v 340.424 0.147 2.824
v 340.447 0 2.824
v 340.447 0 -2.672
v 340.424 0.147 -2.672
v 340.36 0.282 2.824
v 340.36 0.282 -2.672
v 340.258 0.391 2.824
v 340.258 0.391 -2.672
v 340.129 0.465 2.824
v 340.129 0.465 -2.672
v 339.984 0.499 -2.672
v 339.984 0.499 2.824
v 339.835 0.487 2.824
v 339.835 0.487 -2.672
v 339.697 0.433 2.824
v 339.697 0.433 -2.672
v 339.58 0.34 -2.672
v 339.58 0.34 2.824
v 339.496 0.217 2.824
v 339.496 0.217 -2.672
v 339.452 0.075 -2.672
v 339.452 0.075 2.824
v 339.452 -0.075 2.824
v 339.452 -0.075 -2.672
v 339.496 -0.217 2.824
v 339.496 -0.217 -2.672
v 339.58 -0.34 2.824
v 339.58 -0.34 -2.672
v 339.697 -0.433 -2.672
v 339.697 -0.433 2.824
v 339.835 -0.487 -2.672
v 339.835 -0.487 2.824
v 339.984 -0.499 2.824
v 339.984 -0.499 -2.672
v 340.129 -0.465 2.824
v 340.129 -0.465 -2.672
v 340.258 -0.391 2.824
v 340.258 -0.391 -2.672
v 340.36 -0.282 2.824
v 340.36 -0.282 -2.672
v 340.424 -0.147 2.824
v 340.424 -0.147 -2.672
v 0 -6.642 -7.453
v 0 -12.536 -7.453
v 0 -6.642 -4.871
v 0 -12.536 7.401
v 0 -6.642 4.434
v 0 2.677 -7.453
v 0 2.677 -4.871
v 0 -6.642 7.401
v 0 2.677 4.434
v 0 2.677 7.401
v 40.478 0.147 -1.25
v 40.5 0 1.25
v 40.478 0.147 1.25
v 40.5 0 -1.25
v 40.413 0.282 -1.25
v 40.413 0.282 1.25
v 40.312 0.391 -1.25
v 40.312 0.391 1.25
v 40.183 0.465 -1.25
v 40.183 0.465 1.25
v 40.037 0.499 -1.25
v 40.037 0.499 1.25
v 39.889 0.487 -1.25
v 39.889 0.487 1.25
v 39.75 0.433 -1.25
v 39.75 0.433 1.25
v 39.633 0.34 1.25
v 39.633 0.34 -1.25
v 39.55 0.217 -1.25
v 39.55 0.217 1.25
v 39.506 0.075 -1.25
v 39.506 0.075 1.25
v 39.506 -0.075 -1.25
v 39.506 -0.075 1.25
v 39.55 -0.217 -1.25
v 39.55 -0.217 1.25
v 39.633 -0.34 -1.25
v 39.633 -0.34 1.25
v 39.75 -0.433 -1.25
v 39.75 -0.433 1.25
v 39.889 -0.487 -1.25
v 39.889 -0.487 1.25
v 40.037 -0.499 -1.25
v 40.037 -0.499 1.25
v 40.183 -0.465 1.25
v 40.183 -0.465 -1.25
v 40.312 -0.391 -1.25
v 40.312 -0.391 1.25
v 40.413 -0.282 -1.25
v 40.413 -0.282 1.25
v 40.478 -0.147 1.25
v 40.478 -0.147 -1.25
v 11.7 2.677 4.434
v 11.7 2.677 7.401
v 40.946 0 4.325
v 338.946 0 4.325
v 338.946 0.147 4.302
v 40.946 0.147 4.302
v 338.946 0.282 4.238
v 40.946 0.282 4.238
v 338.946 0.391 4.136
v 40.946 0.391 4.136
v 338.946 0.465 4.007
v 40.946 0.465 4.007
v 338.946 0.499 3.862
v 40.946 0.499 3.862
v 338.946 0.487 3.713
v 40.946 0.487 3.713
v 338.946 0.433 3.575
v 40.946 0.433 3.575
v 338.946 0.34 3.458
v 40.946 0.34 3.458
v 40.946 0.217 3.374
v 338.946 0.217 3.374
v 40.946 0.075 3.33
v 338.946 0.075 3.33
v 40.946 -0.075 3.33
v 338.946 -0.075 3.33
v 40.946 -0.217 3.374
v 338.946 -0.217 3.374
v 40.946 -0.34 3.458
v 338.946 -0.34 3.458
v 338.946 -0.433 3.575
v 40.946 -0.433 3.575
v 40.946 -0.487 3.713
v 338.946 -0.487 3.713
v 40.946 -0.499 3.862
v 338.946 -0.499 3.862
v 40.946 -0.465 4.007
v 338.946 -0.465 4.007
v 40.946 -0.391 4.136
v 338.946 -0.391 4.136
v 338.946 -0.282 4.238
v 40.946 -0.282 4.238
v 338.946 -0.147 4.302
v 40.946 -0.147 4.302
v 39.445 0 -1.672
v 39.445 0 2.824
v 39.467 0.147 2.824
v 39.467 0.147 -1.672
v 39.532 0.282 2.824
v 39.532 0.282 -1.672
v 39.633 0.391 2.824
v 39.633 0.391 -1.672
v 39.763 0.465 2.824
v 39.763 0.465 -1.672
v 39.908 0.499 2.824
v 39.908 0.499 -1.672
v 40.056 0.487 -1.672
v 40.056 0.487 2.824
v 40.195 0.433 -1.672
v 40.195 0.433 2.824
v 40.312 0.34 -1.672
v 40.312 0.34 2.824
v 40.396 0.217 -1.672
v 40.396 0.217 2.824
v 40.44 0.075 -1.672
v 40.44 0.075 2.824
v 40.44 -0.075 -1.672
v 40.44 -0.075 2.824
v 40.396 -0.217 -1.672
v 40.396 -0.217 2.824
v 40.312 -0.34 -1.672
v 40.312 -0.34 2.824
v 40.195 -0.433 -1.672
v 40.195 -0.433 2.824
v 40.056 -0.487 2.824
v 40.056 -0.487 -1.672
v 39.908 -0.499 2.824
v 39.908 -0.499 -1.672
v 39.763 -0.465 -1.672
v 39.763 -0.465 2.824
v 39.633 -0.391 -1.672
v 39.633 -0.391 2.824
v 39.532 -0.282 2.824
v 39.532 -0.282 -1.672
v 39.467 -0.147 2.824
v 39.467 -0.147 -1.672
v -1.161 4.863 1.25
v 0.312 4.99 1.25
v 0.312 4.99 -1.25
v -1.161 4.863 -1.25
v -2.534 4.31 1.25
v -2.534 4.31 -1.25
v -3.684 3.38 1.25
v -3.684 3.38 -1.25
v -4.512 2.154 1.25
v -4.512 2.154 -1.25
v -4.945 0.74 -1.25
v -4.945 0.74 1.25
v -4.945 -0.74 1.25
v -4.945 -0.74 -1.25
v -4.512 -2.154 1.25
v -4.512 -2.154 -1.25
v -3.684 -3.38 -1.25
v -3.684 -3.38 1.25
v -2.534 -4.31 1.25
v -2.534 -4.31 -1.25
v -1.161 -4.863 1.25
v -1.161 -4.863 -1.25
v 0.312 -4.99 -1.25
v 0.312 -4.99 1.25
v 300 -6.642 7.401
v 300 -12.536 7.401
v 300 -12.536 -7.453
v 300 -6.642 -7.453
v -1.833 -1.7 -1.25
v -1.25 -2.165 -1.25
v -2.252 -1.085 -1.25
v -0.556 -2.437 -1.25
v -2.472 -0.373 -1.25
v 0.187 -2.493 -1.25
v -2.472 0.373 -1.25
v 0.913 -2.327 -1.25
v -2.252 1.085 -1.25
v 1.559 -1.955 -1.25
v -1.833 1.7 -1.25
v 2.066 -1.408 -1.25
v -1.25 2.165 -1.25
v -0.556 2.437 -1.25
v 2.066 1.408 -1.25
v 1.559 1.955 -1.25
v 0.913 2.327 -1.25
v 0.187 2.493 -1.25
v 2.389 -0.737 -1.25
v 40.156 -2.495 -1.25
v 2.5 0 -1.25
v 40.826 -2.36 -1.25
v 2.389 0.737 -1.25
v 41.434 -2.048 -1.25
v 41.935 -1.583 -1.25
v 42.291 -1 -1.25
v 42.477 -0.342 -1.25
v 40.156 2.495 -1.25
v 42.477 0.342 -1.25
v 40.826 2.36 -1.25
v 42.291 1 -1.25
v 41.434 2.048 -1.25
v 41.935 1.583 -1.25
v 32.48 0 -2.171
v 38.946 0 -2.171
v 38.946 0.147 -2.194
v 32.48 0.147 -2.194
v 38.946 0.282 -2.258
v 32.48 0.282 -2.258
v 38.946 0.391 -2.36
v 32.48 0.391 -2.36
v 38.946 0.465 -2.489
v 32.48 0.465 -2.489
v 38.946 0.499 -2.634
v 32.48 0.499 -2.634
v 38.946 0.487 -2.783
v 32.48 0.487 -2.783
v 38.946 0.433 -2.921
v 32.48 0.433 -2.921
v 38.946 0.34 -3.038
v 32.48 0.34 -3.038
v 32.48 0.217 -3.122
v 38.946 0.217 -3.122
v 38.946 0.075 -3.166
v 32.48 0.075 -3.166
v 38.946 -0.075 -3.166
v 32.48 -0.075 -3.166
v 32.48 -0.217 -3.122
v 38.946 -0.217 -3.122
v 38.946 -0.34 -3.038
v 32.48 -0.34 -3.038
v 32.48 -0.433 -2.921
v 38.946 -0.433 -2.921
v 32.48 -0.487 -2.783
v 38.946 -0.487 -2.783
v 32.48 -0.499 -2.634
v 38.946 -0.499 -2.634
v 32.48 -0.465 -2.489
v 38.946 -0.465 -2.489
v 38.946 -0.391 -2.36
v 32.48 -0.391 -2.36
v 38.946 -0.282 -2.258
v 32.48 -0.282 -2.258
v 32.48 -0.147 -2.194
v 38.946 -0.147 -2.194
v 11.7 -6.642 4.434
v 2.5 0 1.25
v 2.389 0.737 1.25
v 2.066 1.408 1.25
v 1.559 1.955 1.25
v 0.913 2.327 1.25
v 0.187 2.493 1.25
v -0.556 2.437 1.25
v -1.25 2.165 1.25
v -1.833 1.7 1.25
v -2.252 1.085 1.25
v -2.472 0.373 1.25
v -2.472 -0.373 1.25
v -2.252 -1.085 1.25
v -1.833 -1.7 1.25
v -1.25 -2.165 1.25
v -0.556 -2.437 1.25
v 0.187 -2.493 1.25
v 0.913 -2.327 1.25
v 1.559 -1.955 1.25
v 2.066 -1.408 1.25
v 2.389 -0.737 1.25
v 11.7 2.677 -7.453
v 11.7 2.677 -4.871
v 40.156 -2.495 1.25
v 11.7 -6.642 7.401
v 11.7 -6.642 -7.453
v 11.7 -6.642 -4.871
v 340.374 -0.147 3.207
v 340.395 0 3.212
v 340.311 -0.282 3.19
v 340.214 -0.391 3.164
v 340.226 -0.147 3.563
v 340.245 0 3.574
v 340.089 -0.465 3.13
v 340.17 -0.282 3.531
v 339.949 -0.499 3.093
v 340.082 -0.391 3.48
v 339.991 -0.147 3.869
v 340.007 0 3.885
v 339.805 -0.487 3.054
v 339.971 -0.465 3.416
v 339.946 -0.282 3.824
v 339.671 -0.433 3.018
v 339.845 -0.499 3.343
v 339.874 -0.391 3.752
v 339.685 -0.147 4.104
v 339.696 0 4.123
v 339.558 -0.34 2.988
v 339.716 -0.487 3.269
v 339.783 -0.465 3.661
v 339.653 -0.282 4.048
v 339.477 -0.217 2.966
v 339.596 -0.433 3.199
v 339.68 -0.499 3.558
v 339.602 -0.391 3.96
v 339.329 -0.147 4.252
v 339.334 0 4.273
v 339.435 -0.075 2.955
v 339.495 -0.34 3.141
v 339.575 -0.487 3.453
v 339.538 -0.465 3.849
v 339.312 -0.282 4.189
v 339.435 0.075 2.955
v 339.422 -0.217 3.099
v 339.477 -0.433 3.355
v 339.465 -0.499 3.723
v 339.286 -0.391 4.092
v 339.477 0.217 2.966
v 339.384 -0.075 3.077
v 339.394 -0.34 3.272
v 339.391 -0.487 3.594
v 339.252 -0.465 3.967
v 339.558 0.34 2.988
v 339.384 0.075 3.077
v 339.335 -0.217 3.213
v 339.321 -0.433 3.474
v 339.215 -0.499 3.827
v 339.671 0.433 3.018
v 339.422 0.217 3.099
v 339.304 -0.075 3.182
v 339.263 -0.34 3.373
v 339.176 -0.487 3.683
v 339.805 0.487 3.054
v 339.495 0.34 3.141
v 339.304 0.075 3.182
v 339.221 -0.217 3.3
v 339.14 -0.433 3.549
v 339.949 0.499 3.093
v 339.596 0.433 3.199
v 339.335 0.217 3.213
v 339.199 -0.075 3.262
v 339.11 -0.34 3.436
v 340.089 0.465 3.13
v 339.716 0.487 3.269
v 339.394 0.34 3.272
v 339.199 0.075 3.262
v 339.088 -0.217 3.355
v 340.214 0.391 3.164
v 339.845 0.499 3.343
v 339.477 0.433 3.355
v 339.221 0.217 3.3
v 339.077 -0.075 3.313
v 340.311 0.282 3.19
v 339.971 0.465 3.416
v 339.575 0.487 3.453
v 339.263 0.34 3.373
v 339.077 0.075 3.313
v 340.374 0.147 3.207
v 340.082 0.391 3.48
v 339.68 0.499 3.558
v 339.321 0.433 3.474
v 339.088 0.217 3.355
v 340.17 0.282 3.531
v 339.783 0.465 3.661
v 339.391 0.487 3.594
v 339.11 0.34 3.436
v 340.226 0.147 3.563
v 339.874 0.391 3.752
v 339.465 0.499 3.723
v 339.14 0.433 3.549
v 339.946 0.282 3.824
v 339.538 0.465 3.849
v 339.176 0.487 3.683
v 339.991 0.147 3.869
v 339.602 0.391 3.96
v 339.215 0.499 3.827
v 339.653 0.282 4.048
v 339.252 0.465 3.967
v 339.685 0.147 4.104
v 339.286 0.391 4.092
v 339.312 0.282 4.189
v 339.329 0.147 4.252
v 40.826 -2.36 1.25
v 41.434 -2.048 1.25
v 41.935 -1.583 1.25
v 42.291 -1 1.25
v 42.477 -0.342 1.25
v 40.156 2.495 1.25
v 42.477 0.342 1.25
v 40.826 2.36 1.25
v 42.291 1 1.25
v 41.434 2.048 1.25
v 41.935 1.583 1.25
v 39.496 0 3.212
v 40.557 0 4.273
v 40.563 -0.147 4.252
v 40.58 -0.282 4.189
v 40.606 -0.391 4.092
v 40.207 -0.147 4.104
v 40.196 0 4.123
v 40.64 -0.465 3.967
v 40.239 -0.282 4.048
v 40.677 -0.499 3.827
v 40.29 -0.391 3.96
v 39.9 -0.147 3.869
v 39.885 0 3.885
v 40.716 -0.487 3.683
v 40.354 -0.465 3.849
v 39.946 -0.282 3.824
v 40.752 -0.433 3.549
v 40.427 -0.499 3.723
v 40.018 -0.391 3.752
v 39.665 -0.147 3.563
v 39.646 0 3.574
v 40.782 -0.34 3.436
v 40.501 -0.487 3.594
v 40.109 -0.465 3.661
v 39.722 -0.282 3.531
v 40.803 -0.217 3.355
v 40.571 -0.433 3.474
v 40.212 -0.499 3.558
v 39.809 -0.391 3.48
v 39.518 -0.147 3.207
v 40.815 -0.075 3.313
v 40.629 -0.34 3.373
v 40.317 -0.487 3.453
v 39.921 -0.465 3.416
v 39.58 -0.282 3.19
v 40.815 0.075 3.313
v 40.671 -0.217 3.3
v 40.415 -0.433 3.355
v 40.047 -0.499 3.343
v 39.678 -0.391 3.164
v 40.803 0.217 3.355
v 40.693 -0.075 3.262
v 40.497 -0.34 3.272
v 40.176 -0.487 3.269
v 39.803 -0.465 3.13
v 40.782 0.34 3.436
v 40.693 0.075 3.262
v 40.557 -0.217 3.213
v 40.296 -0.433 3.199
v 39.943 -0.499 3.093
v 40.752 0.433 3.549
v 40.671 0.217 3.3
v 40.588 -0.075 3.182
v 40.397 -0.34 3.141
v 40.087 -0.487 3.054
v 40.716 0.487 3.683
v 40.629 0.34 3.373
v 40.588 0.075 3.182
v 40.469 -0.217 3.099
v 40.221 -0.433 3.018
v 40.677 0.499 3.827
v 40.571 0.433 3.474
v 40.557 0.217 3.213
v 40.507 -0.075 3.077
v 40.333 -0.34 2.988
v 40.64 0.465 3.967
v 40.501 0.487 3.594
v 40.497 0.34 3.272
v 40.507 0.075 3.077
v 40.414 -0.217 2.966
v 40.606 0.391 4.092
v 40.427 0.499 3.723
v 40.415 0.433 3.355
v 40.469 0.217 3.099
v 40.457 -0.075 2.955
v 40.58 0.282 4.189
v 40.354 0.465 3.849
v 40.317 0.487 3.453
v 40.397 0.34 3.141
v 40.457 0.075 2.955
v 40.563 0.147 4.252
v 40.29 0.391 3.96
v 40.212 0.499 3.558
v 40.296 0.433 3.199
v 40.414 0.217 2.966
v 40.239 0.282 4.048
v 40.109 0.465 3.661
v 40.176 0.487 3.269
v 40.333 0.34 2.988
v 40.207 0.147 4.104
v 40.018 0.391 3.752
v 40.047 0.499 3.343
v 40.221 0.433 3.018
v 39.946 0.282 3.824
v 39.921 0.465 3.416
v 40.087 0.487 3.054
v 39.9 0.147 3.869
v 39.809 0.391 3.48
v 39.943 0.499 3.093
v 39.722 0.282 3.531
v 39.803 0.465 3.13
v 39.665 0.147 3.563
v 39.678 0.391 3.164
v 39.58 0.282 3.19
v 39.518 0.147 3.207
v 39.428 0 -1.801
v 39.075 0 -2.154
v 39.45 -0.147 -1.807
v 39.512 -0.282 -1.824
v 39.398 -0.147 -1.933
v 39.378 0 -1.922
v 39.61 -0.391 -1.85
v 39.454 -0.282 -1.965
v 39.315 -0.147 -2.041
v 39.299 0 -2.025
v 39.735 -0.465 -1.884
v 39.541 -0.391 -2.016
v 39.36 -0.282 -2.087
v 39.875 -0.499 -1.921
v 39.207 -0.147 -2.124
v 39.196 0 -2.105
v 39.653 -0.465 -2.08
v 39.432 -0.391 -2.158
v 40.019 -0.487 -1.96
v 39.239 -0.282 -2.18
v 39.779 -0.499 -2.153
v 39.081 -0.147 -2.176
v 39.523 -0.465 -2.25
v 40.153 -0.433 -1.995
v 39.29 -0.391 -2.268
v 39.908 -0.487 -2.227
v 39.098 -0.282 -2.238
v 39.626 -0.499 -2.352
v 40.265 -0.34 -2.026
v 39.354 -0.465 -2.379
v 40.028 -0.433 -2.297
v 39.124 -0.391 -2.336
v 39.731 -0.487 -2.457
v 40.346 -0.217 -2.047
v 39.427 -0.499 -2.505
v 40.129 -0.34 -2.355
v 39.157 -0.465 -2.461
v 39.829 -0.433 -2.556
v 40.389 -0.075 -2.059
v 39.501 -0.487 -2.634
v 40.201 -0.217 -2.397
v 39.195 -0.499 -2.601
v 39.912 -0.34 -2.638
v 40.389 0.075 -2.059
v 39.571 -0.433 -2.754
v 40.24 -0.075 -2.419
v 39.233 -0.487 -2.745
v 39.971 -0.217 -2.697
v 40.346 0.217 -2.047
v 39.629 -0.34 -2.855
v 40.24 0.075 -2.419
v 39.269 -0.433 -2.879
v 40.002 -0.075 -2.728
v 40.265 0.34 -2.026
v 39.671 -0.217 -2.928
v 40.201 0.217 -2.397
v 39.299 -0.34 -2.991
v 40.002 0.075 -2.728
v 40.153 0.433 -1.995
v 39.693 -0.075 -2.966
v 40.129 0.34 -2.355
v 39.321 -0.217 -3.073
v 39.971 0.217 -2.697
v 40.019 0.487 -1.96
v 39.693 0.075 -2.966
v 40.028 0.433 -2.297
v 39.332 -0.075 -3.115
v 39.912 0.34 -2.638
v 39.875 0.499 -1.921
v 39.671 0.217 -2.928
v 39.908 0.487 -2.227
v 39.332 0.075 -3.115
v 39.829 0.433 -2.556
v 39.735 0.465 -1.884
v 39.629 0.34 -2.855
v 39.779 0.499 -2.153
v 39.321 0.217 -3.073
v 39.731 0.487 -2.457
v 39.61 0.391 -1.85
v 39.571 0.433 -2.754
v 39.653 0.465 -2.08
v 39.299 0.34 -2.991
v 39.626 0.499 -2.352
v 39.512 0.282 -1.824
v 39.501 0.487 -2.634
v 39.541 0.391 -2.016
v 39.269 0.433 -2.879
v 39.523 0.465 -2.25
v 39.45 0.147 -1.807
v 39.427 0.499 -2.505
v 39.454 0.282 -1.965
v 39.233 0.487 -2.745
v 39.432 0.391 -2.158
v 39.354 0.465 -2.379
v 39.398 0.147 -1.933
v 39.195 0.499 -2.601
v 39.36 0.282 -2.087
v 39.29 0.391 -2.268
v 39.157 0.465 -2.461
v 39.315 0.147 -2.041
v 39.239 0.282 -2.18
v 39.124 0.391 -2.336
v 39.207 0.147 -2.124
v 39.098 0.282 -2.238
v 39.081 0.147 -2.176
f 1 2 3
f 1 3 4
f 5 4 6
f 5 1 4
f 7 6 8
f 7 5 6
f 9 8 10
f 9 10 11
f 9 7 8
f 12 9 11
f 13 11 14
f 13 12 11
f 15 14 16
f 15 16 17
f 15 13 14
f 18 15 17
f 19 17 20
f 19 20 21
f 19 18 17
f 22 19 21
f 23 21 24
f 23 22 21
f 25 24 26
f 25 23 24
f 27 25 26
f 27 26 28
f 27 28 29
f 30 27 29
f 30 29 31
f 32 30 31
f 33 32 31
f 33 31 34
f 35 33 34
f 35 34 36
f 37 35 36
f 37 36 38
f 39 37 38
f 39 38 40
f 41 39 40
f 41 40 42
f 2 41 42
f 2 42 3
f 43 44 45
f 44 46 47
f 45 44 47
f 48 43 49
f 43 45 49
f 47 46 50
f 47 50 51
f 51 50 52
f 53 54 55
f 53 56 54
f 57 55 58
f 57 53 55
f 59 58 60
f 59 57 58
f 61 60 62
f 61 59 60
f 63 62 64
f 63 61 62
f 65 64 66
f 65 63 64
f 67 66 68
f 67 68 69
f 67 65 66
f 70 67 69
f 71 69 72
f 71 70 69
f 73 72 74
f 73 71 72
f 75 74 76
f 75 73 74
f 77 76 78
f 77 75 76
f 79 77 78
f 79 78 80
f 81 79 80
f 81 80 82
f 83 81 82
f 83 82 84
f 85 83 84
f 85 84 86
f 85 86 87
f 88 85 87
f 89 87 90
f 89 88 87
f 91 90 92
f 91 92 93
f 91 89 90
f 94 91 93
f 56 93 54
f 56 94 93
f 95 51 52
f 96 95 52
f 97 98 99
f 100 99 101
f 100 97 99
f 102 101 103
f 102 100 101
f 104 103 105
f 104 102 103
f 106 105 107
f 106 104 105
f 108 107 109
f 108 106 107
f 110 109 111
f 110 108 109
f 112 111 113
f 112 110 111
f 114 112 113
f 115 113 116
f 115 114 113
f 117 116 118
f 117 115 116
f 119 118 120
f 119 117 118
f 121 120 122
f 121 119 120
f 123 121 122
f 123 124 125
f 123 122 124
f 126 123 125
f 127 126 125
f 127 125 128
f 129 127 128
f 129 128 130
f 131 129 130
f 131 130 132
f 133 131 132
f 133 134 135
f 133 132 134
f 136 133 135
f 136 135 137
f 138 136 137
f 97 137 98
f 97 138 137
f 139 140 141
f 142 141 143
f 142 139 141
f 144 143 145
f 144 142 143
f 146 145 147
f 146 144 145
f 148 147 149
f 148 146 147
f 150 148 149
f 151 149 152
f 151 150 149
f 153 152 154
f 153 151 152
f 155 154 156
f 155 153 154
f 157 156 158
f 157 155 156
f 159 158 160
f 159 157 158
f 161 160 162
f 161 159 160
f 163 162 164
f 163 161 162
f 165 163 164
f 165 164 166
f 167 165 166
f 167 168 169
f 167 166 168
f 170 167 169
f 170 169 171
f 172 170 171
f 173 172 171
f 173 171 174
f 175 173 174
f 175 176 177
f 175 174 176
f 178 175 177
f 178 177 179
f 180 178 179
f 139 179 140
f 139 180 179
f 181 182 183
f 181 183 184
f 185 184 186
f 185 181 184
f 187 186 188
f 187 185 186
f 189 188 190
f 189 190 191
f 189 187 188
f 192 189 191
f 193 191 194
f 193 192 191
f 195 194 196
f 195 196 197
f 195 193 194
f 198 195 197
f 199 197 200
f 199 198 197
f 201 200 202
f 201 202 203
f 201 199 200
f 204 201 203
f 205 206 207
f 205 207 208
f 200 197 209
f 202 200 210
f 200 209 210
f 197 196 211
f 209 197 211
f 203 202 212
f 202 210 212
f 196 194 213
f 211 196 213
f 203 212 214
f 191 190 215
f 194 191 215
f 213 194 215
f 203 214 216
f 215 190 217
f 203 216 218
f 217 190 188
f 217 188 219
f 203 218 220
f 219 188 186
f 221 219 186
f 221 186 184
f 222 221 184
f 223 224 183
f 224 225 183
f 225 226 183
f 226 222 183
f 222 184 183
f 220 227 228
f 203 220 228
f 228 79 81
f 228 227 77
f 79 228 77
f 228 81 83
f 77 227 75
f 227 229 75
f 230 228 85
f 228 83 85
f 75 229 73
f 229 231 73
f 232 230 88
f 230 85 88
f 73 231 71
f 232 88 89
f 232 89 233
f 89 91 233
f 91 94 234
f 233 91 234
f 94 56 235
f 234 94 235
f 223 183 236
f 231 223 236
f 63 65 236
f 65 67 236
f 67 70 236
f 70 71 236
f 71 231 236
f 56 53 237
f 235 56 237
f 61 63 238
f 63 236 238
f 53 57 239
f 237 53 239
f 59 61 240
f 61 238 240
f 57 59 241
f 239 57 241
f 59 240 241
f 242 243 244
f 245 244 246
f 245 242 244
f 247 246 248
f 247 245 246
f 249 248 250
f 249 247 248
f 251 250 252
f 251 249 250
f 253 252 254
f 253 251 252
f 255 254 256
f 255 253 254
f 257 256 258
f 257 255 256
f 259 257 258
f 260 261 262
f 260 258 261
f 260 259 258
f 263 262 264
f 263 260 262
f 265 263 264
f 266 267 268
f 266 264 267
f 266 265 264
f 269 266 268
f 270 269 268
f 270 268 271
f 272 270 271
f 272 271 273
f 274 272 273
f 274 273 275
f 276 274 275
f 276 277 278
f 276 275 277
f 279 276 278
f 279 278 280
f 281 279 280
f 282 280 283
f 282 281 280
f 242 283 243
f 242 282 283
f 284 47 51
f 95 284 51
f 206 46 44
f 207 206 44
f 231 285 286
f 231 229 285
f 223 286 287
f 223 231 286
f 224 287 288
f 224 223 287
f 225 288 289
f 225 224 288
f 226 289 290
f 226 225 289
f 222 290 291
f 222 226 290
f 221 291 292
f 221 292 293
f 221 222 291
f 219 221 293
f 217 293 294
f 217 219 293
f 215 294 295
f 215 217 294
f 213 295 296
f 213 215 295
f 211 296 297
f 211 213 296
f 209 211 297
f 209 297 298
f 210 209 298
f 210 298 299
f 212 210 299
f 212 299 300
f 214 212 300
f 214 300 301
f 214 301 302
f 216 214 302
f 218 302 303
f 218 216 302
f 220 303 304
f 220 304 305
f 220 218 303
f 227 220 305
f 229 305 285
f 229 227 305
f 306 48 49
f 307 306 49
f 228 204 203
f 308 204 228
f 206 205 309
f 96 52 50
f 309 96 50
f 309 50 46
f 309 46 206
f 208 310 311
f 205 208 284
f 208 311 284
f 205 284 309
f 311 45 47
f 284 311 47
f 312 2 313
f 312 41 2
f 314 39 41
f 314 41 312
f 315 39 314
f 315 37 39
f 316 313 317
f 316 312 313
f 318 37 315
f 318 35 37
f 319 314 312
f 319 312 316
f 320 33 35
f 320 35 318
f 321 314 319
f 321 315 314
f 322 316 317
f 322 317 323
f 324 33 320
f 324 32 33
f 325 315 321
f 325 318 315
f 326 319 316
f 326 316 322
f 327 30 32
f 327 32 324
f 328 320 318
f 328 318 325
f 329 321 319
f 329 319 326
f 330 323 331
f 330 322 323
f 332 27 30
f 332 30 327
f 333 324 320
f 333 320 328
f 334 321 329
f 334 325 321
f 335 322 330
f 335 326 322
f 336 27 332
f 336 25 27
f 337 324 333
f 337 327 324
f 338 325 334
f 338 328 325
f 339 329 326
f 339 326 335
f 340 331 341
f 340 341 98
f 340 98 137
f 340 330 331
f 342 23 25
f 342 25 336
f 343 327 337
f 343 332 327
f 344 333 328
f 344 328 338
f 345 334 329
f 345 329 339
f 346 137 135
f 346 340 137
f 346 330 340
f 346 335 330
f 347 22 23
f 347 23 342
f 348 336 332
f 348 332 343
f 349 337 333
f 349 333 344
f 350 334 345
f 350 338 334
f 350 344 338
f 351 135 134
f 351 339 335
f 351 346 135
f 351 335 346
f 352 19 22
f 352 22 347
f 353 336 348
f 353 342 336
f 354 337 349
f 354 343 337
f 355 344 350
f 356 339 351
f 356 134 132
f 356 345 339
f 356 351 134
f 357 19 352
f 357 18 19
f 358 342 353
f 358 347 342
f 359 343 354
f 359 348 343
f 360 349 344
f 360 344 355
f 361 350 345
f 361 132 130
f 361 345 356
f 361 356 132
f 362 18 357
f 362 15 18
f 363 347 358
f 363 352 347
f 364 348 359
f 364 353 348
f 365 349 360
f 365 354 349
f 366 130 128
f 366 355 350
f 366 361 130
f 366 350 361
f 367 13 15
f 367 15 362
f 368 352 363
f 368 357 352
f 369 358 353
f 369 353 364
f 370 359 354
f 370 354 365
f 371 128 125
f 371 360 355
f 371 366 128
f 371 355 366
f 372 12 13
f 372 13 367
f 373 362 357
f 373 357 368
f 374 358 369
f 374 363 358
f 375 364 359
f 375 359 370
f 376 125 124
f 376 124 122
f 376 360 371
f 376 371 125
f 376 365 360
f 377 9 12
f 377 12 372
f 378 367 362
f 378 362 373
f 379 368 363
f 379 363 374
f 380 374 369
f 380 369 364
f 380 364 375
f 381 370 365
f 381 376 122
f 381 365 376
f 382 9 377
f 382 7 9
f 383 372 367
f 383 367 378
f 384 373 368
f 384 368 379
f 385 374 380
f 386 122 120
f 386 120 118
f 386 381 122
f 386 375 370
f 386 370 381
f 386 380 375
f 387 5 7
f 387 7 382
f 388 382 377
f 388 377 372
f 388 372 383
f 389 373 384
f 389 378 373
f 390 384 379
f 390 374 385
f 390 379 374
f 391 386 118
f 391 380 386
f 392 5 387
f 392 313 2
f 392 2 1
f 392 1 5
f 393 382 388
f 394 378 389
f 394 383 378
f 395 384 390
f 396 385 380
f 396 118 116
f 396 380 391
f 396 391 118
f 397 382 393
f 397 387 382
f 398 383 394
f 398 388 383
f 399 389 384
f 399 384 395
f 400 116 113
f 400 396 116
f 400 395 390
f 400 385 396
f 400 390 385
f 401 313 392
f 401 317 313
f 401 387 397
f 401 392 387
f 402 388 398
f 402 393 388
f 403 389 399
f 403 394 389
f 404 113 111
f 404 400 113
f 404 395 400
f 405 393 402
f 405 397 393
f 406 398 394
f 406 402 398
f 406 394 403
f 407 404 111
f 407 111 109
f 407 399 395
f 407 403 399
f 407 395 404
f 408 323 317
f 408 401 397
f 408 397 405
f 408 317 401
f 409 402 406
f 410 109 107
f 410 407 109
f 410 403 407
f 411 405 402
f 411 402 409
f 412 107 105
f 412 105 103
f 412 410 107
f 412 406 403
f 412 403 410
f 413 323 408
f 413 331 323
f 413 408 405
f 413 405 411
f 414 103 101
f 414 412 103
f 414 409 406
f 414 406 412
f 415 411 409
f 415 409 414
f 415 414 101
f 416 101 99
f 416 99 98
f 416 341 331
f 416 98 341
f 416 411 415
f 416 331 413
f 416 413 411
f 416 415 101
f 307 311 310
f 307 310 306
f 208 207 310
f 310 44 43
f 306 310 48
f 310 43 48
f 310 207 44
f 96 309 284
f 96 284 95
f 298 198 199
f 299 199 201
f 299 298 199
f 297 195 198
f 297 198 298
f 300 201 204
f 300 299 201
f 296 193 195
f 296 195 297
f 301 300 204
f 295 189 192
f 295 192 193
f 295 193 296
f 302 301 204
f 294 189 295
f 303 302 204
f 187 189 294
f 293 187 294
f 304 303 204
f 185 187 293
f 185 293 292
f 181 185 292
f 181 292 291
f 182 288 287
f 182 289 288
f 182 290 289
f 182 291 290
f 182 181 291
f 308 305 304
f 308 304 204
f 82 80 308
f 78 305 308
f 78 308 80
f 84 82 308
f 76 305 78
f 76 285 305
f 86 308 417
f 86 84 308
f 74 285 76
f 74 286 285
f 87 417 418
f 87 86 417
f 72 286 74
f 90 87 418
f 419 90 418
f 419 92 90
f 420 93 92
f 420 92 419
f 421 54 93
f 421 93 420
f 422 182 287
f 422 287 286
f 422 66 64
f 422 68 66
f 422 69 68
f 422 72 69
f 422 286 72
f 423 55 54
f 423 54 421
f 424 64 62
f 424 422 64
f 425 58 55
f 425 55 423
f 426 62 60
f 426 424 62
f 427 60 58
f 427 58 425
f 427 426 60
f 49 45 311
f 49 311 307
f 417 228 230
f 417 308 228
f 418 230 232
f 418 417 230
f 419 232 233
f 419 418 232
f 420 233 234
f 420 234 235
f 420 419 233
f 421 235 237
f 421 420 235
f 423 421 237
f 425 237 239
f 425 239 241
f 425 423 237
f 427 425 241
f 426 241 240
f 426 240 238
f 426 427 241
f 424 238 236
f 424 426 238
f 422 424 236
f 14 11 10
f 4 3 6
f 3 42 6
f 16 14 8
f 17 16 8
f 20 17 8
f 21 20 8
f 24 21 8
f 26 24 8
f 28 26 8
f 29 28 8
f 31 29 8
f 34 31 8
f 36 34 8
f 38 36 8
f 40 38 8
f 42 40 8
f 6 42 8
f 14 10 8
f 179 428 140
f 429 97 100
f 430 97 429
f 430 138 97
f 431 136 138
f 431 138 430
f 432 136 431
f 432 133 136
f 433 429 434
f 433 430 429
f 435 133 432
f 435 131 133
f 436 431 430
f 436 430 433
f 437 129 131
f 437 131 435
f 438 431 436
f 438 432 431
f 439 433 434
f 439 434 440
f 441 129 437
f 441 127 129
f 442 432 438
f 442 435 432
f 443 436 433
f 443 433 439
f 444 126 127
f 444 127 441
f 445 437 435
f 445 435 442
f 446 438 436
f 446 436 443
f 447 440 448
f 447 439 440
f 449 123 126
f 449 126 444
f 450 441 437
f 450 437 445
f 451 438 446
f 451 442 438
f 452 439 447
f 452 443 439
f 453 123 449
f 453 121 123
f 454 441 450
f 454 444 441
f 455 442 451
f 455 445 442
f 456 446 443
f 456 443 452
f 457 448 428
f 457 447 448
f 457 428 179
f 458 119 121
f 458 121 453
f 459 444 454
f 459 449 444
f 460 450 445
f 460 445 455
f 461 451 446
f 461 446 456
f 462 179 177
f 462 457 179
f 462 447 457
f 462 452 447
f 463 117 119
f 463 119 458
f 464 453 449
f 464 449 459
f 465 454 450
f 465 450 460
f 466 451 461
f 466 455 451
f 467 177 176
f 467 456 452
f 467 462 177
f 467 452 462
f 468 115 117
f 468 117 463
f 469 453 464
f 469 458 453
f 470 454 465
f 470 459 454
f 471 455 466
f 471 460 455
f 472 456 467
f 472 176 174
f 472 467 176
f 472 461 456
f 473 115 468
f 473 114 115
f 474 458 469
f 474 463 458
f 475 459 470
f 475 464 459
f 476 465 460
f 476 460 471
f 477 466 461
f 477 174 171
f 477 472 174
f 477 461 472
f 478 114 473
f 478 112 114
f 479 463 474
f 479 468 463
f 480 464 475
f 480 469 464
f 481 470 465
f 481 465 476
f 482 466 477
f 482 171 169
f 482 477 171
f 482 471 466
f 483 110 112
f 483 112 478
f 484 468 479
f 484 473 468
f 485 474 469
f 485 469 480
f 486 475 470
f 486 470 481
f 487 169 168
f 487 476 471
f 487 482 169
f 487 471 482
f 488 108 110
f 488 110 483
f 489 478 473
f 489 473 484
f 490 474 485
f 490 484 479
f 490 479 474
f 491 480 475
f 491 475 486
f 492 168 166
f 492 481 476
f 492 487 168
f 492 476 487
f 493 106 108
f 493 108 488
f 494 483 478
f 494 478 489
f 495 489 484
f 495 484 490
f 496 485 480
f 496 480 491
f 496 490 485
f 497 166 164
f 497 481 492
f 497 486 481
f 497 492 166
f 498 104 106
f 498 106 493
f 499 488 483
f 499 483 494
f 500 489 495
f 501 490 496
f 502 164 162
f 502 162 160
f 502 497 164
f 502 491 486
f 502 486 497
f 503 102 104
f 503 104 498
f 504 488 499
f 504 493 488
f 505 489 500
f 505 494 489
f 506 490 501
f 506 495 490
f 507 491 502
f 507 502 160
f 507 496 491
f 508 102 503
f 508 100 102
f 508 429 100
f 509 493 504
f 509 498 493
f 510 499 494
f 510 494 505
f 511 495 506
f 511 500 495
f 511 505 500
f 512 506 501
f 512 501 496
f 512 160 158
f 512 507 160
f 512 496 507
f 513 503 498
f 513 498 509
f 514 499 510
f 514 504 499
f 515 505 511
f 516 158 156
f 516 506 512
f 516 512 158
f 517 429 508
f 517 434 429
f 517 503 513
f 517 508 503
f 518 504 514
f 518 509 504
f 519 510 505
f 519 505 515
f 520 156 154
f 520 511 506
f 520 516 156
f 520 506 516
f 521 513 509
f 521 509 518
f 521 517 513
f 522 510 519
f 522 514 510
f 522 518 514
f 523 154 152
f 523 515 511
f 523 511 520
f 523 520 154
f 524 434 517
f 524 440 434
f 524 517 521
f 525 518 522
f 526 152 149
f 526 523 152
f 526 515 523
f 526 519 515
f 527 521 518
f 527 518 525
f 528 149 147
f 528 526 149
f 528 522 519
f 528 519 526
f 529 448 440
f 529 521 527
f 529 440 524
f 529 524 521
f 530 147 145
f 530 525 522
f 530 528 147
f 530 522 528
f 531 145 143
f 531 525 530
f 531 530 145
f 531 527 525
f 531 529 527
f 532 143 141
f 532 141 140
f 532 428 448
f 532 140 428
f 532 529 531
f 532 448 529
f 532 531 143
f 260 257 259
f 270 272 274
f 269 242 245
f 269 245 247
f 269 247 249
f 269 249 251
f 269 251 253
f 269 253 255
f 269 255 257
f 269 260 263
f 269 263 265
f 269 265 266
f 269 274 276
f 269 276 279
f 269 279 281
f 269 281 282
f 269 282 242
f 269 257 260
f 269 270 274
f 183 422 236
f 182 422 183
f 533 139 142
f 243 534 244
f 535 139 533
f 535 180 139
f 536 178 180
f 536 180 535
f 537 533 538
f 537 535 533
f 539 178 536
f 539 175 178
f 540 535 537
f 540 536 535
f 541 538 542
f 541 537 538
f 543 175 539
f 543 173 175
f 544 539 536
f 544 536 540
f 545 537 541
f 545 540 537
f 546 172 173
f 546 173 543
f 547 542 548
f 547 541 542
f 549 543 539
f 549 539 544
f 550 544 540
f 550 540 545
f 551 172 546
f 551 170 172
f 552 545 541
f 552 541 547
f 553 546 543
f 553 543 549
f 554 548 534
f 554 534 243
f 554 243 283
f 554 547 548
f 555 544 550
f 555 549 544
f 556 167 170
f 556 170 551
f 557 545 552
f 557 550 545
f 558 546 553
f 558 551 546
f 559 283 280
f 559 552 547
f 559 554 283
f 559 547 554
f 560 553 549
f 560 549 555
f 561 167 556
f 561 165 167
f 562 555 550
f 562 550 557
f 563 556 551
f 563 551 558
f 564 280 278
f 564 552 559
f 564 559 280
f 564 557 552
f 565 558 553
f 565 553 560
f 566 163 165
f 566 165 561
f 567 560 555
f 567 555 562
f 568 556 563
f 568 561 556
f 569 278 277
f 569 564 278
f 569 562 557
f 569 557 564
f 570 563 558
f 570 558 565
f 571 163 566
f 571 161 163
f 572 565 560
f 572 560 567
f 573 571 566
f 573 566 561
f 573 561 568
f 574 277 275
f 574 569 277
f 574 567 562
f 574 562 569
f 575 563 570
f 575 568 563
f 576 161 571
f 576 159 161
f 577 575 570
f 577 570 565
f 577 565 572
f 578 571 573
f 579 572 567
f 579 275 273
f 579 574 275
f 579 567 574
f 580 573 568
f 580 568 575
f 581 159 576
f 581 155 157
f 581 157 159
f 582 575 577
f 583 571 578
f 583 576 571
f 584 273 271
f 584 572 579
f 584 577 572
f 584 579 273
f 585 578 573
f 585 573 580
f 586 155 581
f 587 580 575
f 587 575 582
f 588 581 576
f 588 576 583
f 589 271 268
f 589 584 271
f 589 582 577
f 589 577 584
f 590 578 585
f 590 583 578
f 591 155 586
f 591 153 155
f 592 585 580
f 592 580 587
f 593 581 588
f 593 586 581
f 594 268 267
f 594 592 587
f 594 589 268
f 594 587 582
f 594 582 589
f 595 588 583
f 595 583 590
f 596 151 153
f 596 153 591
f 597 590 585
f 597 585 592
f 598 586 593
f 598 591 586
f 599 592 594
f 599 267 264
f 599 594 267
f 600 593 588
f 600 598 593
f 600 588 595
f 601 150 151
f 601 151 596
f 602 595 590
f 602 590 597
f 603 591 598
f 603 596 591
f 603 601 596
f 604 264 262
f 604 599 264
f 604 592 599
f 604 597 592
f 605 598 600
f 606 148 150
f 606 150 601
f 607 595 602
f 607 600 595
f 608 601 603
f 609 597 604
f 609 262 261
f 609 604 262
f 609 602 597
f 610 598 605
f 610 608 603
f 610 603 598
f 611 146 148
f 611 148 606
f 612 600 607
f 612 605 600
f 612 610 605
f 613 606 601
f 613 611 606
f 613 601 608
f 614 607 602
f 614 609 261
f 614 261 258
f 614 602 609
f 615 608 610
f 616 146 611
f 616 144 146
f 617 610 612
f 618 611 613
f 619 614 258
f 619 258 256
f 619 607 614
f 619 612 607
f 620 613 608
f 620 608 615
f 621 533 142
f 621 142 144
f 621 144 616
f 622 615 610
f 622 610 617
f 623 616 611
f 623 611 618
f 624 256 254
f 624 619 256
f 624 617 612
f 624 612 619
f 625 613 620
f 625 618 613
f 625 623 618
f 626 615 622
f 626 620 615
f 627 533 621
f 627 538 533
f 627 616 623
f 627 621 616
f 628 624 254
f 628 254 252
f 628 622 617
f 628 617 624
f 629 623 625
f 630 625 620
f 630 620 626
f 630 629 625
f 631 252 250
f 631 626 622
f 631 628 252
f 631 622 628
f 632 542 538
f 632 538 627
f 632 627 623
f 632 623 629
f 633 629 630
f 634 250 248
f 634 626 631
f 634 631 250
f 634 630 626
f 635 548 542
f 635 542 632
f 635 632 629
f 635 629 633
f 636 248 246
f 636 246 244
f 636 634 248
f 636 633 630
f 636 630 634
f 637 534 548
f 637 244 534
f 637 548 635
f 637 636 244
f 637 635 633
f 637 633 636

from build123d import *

# Parameters (mm, degrees)
F1_R     = 2.5
F1_R_2   = 0.5
F2_DEPTH = 1.25
F5_R     = 0.5
F8_DEPTH = 300
F7_W     = 9.3189708423
F7_H     = 2.9665171169
F7_H_2   = 2.5825281627
F9_DEPTH = 11.7


with BuildPart() as f2:
    # F1 (on face) → F2 (new body, symmetric)
    with BuildSketch(Plane.XY):
        with BuildLine():
            ThreePointArc((40.15625, -2.4951124098), (42.5, 0), (40.15625, 2.4951124098))
            Line((40.15625, 2.4951124098), (0.3125, 4.9902248196))
            ThreePointArc((0.3125, 4.9902248196), (-5, 0), (0.3125, -4.9902248196))
            Line((0.3125, -4.9902248196), (40.15625, -2.4951124098))
        make_face()
        Circle(F1_R, mode=Mode.SUBTRACT)
        with Locations((40, 0)):
            Circle(F1_R_2, mode=Mode.SUBTRACT)
    extrude(amount=F2_DEPTH, both=True)


with BuildPart() as f6:
    # F6: sweep along a path in F3
    with BuildLine(Plane.XZ) as f6_path:
        Line((339.9458743632, -2.672146773), (339.9458743632, 2.8238787092))
        ThreePointArc((339.9458743632, 2.8238787092), (339.6529811444, 3.5309854904), (338.9458743632, 3.8238787092))
        Line((338.9458743632, 3.8238787092), (40.9458743632, 3.8238787092))
        ThreePointArc((40.9458743632, 3.8238787092), (40.238767582, 3.5309854904), (39.9458743632, 2.8238787092))
        Line((39.9458743632, 2.8238787092), (39.9458743632, 0))
        Line((39.9458743632, 0), (39.9458743632, -1.672146773))
        ThreePointArc((39.9458743632, -1.672146773), (39.6529811444, -2.3792535542), (38.9458743632, -2.672146773))
        Line((38.9458743632, -2.672146773), (32.4798679948, -2.672146773))
    # F5 (on plane+point) → F6 (sweep)
    with BuildSketch(Plane.XY.offset(-2.672146773)):
        with Locations((339.9465382099, 0)):
            Circle(F5_R)
    sweep(path=f6_path.line)


with BuildPart() as f8:
    # F7 (on Right) → F8 (new body)
    with BuildSketch(Plane.YZ):
        Polygon((-6.6419336945, 7.4009038508), (-12.5363953412, 7.4009038508), (-12.5363953412, -7.4531384744), (-6.6419336945, -7.4531384744), (-6.6419336945, -4.8706103116), (-6.6419336945, 4.4343867339), align=None)
    extrude(amount=F8_DEPTH)

    # F7 (on Right) → F9 (join)
    with BuildSketch(Plane.YZ):
        with Locations((-1.9824482733, 5.9176452924)):
            Rectangle(F7_W, F7_H)
        with Locations((-1.9824482733, -6.161874393)):
            Rectangle(F7_W, F7_H_2)
    extrude(amount=F9_DEPTH)


solid = Compound([f2.part, f6.part, f8.part])
